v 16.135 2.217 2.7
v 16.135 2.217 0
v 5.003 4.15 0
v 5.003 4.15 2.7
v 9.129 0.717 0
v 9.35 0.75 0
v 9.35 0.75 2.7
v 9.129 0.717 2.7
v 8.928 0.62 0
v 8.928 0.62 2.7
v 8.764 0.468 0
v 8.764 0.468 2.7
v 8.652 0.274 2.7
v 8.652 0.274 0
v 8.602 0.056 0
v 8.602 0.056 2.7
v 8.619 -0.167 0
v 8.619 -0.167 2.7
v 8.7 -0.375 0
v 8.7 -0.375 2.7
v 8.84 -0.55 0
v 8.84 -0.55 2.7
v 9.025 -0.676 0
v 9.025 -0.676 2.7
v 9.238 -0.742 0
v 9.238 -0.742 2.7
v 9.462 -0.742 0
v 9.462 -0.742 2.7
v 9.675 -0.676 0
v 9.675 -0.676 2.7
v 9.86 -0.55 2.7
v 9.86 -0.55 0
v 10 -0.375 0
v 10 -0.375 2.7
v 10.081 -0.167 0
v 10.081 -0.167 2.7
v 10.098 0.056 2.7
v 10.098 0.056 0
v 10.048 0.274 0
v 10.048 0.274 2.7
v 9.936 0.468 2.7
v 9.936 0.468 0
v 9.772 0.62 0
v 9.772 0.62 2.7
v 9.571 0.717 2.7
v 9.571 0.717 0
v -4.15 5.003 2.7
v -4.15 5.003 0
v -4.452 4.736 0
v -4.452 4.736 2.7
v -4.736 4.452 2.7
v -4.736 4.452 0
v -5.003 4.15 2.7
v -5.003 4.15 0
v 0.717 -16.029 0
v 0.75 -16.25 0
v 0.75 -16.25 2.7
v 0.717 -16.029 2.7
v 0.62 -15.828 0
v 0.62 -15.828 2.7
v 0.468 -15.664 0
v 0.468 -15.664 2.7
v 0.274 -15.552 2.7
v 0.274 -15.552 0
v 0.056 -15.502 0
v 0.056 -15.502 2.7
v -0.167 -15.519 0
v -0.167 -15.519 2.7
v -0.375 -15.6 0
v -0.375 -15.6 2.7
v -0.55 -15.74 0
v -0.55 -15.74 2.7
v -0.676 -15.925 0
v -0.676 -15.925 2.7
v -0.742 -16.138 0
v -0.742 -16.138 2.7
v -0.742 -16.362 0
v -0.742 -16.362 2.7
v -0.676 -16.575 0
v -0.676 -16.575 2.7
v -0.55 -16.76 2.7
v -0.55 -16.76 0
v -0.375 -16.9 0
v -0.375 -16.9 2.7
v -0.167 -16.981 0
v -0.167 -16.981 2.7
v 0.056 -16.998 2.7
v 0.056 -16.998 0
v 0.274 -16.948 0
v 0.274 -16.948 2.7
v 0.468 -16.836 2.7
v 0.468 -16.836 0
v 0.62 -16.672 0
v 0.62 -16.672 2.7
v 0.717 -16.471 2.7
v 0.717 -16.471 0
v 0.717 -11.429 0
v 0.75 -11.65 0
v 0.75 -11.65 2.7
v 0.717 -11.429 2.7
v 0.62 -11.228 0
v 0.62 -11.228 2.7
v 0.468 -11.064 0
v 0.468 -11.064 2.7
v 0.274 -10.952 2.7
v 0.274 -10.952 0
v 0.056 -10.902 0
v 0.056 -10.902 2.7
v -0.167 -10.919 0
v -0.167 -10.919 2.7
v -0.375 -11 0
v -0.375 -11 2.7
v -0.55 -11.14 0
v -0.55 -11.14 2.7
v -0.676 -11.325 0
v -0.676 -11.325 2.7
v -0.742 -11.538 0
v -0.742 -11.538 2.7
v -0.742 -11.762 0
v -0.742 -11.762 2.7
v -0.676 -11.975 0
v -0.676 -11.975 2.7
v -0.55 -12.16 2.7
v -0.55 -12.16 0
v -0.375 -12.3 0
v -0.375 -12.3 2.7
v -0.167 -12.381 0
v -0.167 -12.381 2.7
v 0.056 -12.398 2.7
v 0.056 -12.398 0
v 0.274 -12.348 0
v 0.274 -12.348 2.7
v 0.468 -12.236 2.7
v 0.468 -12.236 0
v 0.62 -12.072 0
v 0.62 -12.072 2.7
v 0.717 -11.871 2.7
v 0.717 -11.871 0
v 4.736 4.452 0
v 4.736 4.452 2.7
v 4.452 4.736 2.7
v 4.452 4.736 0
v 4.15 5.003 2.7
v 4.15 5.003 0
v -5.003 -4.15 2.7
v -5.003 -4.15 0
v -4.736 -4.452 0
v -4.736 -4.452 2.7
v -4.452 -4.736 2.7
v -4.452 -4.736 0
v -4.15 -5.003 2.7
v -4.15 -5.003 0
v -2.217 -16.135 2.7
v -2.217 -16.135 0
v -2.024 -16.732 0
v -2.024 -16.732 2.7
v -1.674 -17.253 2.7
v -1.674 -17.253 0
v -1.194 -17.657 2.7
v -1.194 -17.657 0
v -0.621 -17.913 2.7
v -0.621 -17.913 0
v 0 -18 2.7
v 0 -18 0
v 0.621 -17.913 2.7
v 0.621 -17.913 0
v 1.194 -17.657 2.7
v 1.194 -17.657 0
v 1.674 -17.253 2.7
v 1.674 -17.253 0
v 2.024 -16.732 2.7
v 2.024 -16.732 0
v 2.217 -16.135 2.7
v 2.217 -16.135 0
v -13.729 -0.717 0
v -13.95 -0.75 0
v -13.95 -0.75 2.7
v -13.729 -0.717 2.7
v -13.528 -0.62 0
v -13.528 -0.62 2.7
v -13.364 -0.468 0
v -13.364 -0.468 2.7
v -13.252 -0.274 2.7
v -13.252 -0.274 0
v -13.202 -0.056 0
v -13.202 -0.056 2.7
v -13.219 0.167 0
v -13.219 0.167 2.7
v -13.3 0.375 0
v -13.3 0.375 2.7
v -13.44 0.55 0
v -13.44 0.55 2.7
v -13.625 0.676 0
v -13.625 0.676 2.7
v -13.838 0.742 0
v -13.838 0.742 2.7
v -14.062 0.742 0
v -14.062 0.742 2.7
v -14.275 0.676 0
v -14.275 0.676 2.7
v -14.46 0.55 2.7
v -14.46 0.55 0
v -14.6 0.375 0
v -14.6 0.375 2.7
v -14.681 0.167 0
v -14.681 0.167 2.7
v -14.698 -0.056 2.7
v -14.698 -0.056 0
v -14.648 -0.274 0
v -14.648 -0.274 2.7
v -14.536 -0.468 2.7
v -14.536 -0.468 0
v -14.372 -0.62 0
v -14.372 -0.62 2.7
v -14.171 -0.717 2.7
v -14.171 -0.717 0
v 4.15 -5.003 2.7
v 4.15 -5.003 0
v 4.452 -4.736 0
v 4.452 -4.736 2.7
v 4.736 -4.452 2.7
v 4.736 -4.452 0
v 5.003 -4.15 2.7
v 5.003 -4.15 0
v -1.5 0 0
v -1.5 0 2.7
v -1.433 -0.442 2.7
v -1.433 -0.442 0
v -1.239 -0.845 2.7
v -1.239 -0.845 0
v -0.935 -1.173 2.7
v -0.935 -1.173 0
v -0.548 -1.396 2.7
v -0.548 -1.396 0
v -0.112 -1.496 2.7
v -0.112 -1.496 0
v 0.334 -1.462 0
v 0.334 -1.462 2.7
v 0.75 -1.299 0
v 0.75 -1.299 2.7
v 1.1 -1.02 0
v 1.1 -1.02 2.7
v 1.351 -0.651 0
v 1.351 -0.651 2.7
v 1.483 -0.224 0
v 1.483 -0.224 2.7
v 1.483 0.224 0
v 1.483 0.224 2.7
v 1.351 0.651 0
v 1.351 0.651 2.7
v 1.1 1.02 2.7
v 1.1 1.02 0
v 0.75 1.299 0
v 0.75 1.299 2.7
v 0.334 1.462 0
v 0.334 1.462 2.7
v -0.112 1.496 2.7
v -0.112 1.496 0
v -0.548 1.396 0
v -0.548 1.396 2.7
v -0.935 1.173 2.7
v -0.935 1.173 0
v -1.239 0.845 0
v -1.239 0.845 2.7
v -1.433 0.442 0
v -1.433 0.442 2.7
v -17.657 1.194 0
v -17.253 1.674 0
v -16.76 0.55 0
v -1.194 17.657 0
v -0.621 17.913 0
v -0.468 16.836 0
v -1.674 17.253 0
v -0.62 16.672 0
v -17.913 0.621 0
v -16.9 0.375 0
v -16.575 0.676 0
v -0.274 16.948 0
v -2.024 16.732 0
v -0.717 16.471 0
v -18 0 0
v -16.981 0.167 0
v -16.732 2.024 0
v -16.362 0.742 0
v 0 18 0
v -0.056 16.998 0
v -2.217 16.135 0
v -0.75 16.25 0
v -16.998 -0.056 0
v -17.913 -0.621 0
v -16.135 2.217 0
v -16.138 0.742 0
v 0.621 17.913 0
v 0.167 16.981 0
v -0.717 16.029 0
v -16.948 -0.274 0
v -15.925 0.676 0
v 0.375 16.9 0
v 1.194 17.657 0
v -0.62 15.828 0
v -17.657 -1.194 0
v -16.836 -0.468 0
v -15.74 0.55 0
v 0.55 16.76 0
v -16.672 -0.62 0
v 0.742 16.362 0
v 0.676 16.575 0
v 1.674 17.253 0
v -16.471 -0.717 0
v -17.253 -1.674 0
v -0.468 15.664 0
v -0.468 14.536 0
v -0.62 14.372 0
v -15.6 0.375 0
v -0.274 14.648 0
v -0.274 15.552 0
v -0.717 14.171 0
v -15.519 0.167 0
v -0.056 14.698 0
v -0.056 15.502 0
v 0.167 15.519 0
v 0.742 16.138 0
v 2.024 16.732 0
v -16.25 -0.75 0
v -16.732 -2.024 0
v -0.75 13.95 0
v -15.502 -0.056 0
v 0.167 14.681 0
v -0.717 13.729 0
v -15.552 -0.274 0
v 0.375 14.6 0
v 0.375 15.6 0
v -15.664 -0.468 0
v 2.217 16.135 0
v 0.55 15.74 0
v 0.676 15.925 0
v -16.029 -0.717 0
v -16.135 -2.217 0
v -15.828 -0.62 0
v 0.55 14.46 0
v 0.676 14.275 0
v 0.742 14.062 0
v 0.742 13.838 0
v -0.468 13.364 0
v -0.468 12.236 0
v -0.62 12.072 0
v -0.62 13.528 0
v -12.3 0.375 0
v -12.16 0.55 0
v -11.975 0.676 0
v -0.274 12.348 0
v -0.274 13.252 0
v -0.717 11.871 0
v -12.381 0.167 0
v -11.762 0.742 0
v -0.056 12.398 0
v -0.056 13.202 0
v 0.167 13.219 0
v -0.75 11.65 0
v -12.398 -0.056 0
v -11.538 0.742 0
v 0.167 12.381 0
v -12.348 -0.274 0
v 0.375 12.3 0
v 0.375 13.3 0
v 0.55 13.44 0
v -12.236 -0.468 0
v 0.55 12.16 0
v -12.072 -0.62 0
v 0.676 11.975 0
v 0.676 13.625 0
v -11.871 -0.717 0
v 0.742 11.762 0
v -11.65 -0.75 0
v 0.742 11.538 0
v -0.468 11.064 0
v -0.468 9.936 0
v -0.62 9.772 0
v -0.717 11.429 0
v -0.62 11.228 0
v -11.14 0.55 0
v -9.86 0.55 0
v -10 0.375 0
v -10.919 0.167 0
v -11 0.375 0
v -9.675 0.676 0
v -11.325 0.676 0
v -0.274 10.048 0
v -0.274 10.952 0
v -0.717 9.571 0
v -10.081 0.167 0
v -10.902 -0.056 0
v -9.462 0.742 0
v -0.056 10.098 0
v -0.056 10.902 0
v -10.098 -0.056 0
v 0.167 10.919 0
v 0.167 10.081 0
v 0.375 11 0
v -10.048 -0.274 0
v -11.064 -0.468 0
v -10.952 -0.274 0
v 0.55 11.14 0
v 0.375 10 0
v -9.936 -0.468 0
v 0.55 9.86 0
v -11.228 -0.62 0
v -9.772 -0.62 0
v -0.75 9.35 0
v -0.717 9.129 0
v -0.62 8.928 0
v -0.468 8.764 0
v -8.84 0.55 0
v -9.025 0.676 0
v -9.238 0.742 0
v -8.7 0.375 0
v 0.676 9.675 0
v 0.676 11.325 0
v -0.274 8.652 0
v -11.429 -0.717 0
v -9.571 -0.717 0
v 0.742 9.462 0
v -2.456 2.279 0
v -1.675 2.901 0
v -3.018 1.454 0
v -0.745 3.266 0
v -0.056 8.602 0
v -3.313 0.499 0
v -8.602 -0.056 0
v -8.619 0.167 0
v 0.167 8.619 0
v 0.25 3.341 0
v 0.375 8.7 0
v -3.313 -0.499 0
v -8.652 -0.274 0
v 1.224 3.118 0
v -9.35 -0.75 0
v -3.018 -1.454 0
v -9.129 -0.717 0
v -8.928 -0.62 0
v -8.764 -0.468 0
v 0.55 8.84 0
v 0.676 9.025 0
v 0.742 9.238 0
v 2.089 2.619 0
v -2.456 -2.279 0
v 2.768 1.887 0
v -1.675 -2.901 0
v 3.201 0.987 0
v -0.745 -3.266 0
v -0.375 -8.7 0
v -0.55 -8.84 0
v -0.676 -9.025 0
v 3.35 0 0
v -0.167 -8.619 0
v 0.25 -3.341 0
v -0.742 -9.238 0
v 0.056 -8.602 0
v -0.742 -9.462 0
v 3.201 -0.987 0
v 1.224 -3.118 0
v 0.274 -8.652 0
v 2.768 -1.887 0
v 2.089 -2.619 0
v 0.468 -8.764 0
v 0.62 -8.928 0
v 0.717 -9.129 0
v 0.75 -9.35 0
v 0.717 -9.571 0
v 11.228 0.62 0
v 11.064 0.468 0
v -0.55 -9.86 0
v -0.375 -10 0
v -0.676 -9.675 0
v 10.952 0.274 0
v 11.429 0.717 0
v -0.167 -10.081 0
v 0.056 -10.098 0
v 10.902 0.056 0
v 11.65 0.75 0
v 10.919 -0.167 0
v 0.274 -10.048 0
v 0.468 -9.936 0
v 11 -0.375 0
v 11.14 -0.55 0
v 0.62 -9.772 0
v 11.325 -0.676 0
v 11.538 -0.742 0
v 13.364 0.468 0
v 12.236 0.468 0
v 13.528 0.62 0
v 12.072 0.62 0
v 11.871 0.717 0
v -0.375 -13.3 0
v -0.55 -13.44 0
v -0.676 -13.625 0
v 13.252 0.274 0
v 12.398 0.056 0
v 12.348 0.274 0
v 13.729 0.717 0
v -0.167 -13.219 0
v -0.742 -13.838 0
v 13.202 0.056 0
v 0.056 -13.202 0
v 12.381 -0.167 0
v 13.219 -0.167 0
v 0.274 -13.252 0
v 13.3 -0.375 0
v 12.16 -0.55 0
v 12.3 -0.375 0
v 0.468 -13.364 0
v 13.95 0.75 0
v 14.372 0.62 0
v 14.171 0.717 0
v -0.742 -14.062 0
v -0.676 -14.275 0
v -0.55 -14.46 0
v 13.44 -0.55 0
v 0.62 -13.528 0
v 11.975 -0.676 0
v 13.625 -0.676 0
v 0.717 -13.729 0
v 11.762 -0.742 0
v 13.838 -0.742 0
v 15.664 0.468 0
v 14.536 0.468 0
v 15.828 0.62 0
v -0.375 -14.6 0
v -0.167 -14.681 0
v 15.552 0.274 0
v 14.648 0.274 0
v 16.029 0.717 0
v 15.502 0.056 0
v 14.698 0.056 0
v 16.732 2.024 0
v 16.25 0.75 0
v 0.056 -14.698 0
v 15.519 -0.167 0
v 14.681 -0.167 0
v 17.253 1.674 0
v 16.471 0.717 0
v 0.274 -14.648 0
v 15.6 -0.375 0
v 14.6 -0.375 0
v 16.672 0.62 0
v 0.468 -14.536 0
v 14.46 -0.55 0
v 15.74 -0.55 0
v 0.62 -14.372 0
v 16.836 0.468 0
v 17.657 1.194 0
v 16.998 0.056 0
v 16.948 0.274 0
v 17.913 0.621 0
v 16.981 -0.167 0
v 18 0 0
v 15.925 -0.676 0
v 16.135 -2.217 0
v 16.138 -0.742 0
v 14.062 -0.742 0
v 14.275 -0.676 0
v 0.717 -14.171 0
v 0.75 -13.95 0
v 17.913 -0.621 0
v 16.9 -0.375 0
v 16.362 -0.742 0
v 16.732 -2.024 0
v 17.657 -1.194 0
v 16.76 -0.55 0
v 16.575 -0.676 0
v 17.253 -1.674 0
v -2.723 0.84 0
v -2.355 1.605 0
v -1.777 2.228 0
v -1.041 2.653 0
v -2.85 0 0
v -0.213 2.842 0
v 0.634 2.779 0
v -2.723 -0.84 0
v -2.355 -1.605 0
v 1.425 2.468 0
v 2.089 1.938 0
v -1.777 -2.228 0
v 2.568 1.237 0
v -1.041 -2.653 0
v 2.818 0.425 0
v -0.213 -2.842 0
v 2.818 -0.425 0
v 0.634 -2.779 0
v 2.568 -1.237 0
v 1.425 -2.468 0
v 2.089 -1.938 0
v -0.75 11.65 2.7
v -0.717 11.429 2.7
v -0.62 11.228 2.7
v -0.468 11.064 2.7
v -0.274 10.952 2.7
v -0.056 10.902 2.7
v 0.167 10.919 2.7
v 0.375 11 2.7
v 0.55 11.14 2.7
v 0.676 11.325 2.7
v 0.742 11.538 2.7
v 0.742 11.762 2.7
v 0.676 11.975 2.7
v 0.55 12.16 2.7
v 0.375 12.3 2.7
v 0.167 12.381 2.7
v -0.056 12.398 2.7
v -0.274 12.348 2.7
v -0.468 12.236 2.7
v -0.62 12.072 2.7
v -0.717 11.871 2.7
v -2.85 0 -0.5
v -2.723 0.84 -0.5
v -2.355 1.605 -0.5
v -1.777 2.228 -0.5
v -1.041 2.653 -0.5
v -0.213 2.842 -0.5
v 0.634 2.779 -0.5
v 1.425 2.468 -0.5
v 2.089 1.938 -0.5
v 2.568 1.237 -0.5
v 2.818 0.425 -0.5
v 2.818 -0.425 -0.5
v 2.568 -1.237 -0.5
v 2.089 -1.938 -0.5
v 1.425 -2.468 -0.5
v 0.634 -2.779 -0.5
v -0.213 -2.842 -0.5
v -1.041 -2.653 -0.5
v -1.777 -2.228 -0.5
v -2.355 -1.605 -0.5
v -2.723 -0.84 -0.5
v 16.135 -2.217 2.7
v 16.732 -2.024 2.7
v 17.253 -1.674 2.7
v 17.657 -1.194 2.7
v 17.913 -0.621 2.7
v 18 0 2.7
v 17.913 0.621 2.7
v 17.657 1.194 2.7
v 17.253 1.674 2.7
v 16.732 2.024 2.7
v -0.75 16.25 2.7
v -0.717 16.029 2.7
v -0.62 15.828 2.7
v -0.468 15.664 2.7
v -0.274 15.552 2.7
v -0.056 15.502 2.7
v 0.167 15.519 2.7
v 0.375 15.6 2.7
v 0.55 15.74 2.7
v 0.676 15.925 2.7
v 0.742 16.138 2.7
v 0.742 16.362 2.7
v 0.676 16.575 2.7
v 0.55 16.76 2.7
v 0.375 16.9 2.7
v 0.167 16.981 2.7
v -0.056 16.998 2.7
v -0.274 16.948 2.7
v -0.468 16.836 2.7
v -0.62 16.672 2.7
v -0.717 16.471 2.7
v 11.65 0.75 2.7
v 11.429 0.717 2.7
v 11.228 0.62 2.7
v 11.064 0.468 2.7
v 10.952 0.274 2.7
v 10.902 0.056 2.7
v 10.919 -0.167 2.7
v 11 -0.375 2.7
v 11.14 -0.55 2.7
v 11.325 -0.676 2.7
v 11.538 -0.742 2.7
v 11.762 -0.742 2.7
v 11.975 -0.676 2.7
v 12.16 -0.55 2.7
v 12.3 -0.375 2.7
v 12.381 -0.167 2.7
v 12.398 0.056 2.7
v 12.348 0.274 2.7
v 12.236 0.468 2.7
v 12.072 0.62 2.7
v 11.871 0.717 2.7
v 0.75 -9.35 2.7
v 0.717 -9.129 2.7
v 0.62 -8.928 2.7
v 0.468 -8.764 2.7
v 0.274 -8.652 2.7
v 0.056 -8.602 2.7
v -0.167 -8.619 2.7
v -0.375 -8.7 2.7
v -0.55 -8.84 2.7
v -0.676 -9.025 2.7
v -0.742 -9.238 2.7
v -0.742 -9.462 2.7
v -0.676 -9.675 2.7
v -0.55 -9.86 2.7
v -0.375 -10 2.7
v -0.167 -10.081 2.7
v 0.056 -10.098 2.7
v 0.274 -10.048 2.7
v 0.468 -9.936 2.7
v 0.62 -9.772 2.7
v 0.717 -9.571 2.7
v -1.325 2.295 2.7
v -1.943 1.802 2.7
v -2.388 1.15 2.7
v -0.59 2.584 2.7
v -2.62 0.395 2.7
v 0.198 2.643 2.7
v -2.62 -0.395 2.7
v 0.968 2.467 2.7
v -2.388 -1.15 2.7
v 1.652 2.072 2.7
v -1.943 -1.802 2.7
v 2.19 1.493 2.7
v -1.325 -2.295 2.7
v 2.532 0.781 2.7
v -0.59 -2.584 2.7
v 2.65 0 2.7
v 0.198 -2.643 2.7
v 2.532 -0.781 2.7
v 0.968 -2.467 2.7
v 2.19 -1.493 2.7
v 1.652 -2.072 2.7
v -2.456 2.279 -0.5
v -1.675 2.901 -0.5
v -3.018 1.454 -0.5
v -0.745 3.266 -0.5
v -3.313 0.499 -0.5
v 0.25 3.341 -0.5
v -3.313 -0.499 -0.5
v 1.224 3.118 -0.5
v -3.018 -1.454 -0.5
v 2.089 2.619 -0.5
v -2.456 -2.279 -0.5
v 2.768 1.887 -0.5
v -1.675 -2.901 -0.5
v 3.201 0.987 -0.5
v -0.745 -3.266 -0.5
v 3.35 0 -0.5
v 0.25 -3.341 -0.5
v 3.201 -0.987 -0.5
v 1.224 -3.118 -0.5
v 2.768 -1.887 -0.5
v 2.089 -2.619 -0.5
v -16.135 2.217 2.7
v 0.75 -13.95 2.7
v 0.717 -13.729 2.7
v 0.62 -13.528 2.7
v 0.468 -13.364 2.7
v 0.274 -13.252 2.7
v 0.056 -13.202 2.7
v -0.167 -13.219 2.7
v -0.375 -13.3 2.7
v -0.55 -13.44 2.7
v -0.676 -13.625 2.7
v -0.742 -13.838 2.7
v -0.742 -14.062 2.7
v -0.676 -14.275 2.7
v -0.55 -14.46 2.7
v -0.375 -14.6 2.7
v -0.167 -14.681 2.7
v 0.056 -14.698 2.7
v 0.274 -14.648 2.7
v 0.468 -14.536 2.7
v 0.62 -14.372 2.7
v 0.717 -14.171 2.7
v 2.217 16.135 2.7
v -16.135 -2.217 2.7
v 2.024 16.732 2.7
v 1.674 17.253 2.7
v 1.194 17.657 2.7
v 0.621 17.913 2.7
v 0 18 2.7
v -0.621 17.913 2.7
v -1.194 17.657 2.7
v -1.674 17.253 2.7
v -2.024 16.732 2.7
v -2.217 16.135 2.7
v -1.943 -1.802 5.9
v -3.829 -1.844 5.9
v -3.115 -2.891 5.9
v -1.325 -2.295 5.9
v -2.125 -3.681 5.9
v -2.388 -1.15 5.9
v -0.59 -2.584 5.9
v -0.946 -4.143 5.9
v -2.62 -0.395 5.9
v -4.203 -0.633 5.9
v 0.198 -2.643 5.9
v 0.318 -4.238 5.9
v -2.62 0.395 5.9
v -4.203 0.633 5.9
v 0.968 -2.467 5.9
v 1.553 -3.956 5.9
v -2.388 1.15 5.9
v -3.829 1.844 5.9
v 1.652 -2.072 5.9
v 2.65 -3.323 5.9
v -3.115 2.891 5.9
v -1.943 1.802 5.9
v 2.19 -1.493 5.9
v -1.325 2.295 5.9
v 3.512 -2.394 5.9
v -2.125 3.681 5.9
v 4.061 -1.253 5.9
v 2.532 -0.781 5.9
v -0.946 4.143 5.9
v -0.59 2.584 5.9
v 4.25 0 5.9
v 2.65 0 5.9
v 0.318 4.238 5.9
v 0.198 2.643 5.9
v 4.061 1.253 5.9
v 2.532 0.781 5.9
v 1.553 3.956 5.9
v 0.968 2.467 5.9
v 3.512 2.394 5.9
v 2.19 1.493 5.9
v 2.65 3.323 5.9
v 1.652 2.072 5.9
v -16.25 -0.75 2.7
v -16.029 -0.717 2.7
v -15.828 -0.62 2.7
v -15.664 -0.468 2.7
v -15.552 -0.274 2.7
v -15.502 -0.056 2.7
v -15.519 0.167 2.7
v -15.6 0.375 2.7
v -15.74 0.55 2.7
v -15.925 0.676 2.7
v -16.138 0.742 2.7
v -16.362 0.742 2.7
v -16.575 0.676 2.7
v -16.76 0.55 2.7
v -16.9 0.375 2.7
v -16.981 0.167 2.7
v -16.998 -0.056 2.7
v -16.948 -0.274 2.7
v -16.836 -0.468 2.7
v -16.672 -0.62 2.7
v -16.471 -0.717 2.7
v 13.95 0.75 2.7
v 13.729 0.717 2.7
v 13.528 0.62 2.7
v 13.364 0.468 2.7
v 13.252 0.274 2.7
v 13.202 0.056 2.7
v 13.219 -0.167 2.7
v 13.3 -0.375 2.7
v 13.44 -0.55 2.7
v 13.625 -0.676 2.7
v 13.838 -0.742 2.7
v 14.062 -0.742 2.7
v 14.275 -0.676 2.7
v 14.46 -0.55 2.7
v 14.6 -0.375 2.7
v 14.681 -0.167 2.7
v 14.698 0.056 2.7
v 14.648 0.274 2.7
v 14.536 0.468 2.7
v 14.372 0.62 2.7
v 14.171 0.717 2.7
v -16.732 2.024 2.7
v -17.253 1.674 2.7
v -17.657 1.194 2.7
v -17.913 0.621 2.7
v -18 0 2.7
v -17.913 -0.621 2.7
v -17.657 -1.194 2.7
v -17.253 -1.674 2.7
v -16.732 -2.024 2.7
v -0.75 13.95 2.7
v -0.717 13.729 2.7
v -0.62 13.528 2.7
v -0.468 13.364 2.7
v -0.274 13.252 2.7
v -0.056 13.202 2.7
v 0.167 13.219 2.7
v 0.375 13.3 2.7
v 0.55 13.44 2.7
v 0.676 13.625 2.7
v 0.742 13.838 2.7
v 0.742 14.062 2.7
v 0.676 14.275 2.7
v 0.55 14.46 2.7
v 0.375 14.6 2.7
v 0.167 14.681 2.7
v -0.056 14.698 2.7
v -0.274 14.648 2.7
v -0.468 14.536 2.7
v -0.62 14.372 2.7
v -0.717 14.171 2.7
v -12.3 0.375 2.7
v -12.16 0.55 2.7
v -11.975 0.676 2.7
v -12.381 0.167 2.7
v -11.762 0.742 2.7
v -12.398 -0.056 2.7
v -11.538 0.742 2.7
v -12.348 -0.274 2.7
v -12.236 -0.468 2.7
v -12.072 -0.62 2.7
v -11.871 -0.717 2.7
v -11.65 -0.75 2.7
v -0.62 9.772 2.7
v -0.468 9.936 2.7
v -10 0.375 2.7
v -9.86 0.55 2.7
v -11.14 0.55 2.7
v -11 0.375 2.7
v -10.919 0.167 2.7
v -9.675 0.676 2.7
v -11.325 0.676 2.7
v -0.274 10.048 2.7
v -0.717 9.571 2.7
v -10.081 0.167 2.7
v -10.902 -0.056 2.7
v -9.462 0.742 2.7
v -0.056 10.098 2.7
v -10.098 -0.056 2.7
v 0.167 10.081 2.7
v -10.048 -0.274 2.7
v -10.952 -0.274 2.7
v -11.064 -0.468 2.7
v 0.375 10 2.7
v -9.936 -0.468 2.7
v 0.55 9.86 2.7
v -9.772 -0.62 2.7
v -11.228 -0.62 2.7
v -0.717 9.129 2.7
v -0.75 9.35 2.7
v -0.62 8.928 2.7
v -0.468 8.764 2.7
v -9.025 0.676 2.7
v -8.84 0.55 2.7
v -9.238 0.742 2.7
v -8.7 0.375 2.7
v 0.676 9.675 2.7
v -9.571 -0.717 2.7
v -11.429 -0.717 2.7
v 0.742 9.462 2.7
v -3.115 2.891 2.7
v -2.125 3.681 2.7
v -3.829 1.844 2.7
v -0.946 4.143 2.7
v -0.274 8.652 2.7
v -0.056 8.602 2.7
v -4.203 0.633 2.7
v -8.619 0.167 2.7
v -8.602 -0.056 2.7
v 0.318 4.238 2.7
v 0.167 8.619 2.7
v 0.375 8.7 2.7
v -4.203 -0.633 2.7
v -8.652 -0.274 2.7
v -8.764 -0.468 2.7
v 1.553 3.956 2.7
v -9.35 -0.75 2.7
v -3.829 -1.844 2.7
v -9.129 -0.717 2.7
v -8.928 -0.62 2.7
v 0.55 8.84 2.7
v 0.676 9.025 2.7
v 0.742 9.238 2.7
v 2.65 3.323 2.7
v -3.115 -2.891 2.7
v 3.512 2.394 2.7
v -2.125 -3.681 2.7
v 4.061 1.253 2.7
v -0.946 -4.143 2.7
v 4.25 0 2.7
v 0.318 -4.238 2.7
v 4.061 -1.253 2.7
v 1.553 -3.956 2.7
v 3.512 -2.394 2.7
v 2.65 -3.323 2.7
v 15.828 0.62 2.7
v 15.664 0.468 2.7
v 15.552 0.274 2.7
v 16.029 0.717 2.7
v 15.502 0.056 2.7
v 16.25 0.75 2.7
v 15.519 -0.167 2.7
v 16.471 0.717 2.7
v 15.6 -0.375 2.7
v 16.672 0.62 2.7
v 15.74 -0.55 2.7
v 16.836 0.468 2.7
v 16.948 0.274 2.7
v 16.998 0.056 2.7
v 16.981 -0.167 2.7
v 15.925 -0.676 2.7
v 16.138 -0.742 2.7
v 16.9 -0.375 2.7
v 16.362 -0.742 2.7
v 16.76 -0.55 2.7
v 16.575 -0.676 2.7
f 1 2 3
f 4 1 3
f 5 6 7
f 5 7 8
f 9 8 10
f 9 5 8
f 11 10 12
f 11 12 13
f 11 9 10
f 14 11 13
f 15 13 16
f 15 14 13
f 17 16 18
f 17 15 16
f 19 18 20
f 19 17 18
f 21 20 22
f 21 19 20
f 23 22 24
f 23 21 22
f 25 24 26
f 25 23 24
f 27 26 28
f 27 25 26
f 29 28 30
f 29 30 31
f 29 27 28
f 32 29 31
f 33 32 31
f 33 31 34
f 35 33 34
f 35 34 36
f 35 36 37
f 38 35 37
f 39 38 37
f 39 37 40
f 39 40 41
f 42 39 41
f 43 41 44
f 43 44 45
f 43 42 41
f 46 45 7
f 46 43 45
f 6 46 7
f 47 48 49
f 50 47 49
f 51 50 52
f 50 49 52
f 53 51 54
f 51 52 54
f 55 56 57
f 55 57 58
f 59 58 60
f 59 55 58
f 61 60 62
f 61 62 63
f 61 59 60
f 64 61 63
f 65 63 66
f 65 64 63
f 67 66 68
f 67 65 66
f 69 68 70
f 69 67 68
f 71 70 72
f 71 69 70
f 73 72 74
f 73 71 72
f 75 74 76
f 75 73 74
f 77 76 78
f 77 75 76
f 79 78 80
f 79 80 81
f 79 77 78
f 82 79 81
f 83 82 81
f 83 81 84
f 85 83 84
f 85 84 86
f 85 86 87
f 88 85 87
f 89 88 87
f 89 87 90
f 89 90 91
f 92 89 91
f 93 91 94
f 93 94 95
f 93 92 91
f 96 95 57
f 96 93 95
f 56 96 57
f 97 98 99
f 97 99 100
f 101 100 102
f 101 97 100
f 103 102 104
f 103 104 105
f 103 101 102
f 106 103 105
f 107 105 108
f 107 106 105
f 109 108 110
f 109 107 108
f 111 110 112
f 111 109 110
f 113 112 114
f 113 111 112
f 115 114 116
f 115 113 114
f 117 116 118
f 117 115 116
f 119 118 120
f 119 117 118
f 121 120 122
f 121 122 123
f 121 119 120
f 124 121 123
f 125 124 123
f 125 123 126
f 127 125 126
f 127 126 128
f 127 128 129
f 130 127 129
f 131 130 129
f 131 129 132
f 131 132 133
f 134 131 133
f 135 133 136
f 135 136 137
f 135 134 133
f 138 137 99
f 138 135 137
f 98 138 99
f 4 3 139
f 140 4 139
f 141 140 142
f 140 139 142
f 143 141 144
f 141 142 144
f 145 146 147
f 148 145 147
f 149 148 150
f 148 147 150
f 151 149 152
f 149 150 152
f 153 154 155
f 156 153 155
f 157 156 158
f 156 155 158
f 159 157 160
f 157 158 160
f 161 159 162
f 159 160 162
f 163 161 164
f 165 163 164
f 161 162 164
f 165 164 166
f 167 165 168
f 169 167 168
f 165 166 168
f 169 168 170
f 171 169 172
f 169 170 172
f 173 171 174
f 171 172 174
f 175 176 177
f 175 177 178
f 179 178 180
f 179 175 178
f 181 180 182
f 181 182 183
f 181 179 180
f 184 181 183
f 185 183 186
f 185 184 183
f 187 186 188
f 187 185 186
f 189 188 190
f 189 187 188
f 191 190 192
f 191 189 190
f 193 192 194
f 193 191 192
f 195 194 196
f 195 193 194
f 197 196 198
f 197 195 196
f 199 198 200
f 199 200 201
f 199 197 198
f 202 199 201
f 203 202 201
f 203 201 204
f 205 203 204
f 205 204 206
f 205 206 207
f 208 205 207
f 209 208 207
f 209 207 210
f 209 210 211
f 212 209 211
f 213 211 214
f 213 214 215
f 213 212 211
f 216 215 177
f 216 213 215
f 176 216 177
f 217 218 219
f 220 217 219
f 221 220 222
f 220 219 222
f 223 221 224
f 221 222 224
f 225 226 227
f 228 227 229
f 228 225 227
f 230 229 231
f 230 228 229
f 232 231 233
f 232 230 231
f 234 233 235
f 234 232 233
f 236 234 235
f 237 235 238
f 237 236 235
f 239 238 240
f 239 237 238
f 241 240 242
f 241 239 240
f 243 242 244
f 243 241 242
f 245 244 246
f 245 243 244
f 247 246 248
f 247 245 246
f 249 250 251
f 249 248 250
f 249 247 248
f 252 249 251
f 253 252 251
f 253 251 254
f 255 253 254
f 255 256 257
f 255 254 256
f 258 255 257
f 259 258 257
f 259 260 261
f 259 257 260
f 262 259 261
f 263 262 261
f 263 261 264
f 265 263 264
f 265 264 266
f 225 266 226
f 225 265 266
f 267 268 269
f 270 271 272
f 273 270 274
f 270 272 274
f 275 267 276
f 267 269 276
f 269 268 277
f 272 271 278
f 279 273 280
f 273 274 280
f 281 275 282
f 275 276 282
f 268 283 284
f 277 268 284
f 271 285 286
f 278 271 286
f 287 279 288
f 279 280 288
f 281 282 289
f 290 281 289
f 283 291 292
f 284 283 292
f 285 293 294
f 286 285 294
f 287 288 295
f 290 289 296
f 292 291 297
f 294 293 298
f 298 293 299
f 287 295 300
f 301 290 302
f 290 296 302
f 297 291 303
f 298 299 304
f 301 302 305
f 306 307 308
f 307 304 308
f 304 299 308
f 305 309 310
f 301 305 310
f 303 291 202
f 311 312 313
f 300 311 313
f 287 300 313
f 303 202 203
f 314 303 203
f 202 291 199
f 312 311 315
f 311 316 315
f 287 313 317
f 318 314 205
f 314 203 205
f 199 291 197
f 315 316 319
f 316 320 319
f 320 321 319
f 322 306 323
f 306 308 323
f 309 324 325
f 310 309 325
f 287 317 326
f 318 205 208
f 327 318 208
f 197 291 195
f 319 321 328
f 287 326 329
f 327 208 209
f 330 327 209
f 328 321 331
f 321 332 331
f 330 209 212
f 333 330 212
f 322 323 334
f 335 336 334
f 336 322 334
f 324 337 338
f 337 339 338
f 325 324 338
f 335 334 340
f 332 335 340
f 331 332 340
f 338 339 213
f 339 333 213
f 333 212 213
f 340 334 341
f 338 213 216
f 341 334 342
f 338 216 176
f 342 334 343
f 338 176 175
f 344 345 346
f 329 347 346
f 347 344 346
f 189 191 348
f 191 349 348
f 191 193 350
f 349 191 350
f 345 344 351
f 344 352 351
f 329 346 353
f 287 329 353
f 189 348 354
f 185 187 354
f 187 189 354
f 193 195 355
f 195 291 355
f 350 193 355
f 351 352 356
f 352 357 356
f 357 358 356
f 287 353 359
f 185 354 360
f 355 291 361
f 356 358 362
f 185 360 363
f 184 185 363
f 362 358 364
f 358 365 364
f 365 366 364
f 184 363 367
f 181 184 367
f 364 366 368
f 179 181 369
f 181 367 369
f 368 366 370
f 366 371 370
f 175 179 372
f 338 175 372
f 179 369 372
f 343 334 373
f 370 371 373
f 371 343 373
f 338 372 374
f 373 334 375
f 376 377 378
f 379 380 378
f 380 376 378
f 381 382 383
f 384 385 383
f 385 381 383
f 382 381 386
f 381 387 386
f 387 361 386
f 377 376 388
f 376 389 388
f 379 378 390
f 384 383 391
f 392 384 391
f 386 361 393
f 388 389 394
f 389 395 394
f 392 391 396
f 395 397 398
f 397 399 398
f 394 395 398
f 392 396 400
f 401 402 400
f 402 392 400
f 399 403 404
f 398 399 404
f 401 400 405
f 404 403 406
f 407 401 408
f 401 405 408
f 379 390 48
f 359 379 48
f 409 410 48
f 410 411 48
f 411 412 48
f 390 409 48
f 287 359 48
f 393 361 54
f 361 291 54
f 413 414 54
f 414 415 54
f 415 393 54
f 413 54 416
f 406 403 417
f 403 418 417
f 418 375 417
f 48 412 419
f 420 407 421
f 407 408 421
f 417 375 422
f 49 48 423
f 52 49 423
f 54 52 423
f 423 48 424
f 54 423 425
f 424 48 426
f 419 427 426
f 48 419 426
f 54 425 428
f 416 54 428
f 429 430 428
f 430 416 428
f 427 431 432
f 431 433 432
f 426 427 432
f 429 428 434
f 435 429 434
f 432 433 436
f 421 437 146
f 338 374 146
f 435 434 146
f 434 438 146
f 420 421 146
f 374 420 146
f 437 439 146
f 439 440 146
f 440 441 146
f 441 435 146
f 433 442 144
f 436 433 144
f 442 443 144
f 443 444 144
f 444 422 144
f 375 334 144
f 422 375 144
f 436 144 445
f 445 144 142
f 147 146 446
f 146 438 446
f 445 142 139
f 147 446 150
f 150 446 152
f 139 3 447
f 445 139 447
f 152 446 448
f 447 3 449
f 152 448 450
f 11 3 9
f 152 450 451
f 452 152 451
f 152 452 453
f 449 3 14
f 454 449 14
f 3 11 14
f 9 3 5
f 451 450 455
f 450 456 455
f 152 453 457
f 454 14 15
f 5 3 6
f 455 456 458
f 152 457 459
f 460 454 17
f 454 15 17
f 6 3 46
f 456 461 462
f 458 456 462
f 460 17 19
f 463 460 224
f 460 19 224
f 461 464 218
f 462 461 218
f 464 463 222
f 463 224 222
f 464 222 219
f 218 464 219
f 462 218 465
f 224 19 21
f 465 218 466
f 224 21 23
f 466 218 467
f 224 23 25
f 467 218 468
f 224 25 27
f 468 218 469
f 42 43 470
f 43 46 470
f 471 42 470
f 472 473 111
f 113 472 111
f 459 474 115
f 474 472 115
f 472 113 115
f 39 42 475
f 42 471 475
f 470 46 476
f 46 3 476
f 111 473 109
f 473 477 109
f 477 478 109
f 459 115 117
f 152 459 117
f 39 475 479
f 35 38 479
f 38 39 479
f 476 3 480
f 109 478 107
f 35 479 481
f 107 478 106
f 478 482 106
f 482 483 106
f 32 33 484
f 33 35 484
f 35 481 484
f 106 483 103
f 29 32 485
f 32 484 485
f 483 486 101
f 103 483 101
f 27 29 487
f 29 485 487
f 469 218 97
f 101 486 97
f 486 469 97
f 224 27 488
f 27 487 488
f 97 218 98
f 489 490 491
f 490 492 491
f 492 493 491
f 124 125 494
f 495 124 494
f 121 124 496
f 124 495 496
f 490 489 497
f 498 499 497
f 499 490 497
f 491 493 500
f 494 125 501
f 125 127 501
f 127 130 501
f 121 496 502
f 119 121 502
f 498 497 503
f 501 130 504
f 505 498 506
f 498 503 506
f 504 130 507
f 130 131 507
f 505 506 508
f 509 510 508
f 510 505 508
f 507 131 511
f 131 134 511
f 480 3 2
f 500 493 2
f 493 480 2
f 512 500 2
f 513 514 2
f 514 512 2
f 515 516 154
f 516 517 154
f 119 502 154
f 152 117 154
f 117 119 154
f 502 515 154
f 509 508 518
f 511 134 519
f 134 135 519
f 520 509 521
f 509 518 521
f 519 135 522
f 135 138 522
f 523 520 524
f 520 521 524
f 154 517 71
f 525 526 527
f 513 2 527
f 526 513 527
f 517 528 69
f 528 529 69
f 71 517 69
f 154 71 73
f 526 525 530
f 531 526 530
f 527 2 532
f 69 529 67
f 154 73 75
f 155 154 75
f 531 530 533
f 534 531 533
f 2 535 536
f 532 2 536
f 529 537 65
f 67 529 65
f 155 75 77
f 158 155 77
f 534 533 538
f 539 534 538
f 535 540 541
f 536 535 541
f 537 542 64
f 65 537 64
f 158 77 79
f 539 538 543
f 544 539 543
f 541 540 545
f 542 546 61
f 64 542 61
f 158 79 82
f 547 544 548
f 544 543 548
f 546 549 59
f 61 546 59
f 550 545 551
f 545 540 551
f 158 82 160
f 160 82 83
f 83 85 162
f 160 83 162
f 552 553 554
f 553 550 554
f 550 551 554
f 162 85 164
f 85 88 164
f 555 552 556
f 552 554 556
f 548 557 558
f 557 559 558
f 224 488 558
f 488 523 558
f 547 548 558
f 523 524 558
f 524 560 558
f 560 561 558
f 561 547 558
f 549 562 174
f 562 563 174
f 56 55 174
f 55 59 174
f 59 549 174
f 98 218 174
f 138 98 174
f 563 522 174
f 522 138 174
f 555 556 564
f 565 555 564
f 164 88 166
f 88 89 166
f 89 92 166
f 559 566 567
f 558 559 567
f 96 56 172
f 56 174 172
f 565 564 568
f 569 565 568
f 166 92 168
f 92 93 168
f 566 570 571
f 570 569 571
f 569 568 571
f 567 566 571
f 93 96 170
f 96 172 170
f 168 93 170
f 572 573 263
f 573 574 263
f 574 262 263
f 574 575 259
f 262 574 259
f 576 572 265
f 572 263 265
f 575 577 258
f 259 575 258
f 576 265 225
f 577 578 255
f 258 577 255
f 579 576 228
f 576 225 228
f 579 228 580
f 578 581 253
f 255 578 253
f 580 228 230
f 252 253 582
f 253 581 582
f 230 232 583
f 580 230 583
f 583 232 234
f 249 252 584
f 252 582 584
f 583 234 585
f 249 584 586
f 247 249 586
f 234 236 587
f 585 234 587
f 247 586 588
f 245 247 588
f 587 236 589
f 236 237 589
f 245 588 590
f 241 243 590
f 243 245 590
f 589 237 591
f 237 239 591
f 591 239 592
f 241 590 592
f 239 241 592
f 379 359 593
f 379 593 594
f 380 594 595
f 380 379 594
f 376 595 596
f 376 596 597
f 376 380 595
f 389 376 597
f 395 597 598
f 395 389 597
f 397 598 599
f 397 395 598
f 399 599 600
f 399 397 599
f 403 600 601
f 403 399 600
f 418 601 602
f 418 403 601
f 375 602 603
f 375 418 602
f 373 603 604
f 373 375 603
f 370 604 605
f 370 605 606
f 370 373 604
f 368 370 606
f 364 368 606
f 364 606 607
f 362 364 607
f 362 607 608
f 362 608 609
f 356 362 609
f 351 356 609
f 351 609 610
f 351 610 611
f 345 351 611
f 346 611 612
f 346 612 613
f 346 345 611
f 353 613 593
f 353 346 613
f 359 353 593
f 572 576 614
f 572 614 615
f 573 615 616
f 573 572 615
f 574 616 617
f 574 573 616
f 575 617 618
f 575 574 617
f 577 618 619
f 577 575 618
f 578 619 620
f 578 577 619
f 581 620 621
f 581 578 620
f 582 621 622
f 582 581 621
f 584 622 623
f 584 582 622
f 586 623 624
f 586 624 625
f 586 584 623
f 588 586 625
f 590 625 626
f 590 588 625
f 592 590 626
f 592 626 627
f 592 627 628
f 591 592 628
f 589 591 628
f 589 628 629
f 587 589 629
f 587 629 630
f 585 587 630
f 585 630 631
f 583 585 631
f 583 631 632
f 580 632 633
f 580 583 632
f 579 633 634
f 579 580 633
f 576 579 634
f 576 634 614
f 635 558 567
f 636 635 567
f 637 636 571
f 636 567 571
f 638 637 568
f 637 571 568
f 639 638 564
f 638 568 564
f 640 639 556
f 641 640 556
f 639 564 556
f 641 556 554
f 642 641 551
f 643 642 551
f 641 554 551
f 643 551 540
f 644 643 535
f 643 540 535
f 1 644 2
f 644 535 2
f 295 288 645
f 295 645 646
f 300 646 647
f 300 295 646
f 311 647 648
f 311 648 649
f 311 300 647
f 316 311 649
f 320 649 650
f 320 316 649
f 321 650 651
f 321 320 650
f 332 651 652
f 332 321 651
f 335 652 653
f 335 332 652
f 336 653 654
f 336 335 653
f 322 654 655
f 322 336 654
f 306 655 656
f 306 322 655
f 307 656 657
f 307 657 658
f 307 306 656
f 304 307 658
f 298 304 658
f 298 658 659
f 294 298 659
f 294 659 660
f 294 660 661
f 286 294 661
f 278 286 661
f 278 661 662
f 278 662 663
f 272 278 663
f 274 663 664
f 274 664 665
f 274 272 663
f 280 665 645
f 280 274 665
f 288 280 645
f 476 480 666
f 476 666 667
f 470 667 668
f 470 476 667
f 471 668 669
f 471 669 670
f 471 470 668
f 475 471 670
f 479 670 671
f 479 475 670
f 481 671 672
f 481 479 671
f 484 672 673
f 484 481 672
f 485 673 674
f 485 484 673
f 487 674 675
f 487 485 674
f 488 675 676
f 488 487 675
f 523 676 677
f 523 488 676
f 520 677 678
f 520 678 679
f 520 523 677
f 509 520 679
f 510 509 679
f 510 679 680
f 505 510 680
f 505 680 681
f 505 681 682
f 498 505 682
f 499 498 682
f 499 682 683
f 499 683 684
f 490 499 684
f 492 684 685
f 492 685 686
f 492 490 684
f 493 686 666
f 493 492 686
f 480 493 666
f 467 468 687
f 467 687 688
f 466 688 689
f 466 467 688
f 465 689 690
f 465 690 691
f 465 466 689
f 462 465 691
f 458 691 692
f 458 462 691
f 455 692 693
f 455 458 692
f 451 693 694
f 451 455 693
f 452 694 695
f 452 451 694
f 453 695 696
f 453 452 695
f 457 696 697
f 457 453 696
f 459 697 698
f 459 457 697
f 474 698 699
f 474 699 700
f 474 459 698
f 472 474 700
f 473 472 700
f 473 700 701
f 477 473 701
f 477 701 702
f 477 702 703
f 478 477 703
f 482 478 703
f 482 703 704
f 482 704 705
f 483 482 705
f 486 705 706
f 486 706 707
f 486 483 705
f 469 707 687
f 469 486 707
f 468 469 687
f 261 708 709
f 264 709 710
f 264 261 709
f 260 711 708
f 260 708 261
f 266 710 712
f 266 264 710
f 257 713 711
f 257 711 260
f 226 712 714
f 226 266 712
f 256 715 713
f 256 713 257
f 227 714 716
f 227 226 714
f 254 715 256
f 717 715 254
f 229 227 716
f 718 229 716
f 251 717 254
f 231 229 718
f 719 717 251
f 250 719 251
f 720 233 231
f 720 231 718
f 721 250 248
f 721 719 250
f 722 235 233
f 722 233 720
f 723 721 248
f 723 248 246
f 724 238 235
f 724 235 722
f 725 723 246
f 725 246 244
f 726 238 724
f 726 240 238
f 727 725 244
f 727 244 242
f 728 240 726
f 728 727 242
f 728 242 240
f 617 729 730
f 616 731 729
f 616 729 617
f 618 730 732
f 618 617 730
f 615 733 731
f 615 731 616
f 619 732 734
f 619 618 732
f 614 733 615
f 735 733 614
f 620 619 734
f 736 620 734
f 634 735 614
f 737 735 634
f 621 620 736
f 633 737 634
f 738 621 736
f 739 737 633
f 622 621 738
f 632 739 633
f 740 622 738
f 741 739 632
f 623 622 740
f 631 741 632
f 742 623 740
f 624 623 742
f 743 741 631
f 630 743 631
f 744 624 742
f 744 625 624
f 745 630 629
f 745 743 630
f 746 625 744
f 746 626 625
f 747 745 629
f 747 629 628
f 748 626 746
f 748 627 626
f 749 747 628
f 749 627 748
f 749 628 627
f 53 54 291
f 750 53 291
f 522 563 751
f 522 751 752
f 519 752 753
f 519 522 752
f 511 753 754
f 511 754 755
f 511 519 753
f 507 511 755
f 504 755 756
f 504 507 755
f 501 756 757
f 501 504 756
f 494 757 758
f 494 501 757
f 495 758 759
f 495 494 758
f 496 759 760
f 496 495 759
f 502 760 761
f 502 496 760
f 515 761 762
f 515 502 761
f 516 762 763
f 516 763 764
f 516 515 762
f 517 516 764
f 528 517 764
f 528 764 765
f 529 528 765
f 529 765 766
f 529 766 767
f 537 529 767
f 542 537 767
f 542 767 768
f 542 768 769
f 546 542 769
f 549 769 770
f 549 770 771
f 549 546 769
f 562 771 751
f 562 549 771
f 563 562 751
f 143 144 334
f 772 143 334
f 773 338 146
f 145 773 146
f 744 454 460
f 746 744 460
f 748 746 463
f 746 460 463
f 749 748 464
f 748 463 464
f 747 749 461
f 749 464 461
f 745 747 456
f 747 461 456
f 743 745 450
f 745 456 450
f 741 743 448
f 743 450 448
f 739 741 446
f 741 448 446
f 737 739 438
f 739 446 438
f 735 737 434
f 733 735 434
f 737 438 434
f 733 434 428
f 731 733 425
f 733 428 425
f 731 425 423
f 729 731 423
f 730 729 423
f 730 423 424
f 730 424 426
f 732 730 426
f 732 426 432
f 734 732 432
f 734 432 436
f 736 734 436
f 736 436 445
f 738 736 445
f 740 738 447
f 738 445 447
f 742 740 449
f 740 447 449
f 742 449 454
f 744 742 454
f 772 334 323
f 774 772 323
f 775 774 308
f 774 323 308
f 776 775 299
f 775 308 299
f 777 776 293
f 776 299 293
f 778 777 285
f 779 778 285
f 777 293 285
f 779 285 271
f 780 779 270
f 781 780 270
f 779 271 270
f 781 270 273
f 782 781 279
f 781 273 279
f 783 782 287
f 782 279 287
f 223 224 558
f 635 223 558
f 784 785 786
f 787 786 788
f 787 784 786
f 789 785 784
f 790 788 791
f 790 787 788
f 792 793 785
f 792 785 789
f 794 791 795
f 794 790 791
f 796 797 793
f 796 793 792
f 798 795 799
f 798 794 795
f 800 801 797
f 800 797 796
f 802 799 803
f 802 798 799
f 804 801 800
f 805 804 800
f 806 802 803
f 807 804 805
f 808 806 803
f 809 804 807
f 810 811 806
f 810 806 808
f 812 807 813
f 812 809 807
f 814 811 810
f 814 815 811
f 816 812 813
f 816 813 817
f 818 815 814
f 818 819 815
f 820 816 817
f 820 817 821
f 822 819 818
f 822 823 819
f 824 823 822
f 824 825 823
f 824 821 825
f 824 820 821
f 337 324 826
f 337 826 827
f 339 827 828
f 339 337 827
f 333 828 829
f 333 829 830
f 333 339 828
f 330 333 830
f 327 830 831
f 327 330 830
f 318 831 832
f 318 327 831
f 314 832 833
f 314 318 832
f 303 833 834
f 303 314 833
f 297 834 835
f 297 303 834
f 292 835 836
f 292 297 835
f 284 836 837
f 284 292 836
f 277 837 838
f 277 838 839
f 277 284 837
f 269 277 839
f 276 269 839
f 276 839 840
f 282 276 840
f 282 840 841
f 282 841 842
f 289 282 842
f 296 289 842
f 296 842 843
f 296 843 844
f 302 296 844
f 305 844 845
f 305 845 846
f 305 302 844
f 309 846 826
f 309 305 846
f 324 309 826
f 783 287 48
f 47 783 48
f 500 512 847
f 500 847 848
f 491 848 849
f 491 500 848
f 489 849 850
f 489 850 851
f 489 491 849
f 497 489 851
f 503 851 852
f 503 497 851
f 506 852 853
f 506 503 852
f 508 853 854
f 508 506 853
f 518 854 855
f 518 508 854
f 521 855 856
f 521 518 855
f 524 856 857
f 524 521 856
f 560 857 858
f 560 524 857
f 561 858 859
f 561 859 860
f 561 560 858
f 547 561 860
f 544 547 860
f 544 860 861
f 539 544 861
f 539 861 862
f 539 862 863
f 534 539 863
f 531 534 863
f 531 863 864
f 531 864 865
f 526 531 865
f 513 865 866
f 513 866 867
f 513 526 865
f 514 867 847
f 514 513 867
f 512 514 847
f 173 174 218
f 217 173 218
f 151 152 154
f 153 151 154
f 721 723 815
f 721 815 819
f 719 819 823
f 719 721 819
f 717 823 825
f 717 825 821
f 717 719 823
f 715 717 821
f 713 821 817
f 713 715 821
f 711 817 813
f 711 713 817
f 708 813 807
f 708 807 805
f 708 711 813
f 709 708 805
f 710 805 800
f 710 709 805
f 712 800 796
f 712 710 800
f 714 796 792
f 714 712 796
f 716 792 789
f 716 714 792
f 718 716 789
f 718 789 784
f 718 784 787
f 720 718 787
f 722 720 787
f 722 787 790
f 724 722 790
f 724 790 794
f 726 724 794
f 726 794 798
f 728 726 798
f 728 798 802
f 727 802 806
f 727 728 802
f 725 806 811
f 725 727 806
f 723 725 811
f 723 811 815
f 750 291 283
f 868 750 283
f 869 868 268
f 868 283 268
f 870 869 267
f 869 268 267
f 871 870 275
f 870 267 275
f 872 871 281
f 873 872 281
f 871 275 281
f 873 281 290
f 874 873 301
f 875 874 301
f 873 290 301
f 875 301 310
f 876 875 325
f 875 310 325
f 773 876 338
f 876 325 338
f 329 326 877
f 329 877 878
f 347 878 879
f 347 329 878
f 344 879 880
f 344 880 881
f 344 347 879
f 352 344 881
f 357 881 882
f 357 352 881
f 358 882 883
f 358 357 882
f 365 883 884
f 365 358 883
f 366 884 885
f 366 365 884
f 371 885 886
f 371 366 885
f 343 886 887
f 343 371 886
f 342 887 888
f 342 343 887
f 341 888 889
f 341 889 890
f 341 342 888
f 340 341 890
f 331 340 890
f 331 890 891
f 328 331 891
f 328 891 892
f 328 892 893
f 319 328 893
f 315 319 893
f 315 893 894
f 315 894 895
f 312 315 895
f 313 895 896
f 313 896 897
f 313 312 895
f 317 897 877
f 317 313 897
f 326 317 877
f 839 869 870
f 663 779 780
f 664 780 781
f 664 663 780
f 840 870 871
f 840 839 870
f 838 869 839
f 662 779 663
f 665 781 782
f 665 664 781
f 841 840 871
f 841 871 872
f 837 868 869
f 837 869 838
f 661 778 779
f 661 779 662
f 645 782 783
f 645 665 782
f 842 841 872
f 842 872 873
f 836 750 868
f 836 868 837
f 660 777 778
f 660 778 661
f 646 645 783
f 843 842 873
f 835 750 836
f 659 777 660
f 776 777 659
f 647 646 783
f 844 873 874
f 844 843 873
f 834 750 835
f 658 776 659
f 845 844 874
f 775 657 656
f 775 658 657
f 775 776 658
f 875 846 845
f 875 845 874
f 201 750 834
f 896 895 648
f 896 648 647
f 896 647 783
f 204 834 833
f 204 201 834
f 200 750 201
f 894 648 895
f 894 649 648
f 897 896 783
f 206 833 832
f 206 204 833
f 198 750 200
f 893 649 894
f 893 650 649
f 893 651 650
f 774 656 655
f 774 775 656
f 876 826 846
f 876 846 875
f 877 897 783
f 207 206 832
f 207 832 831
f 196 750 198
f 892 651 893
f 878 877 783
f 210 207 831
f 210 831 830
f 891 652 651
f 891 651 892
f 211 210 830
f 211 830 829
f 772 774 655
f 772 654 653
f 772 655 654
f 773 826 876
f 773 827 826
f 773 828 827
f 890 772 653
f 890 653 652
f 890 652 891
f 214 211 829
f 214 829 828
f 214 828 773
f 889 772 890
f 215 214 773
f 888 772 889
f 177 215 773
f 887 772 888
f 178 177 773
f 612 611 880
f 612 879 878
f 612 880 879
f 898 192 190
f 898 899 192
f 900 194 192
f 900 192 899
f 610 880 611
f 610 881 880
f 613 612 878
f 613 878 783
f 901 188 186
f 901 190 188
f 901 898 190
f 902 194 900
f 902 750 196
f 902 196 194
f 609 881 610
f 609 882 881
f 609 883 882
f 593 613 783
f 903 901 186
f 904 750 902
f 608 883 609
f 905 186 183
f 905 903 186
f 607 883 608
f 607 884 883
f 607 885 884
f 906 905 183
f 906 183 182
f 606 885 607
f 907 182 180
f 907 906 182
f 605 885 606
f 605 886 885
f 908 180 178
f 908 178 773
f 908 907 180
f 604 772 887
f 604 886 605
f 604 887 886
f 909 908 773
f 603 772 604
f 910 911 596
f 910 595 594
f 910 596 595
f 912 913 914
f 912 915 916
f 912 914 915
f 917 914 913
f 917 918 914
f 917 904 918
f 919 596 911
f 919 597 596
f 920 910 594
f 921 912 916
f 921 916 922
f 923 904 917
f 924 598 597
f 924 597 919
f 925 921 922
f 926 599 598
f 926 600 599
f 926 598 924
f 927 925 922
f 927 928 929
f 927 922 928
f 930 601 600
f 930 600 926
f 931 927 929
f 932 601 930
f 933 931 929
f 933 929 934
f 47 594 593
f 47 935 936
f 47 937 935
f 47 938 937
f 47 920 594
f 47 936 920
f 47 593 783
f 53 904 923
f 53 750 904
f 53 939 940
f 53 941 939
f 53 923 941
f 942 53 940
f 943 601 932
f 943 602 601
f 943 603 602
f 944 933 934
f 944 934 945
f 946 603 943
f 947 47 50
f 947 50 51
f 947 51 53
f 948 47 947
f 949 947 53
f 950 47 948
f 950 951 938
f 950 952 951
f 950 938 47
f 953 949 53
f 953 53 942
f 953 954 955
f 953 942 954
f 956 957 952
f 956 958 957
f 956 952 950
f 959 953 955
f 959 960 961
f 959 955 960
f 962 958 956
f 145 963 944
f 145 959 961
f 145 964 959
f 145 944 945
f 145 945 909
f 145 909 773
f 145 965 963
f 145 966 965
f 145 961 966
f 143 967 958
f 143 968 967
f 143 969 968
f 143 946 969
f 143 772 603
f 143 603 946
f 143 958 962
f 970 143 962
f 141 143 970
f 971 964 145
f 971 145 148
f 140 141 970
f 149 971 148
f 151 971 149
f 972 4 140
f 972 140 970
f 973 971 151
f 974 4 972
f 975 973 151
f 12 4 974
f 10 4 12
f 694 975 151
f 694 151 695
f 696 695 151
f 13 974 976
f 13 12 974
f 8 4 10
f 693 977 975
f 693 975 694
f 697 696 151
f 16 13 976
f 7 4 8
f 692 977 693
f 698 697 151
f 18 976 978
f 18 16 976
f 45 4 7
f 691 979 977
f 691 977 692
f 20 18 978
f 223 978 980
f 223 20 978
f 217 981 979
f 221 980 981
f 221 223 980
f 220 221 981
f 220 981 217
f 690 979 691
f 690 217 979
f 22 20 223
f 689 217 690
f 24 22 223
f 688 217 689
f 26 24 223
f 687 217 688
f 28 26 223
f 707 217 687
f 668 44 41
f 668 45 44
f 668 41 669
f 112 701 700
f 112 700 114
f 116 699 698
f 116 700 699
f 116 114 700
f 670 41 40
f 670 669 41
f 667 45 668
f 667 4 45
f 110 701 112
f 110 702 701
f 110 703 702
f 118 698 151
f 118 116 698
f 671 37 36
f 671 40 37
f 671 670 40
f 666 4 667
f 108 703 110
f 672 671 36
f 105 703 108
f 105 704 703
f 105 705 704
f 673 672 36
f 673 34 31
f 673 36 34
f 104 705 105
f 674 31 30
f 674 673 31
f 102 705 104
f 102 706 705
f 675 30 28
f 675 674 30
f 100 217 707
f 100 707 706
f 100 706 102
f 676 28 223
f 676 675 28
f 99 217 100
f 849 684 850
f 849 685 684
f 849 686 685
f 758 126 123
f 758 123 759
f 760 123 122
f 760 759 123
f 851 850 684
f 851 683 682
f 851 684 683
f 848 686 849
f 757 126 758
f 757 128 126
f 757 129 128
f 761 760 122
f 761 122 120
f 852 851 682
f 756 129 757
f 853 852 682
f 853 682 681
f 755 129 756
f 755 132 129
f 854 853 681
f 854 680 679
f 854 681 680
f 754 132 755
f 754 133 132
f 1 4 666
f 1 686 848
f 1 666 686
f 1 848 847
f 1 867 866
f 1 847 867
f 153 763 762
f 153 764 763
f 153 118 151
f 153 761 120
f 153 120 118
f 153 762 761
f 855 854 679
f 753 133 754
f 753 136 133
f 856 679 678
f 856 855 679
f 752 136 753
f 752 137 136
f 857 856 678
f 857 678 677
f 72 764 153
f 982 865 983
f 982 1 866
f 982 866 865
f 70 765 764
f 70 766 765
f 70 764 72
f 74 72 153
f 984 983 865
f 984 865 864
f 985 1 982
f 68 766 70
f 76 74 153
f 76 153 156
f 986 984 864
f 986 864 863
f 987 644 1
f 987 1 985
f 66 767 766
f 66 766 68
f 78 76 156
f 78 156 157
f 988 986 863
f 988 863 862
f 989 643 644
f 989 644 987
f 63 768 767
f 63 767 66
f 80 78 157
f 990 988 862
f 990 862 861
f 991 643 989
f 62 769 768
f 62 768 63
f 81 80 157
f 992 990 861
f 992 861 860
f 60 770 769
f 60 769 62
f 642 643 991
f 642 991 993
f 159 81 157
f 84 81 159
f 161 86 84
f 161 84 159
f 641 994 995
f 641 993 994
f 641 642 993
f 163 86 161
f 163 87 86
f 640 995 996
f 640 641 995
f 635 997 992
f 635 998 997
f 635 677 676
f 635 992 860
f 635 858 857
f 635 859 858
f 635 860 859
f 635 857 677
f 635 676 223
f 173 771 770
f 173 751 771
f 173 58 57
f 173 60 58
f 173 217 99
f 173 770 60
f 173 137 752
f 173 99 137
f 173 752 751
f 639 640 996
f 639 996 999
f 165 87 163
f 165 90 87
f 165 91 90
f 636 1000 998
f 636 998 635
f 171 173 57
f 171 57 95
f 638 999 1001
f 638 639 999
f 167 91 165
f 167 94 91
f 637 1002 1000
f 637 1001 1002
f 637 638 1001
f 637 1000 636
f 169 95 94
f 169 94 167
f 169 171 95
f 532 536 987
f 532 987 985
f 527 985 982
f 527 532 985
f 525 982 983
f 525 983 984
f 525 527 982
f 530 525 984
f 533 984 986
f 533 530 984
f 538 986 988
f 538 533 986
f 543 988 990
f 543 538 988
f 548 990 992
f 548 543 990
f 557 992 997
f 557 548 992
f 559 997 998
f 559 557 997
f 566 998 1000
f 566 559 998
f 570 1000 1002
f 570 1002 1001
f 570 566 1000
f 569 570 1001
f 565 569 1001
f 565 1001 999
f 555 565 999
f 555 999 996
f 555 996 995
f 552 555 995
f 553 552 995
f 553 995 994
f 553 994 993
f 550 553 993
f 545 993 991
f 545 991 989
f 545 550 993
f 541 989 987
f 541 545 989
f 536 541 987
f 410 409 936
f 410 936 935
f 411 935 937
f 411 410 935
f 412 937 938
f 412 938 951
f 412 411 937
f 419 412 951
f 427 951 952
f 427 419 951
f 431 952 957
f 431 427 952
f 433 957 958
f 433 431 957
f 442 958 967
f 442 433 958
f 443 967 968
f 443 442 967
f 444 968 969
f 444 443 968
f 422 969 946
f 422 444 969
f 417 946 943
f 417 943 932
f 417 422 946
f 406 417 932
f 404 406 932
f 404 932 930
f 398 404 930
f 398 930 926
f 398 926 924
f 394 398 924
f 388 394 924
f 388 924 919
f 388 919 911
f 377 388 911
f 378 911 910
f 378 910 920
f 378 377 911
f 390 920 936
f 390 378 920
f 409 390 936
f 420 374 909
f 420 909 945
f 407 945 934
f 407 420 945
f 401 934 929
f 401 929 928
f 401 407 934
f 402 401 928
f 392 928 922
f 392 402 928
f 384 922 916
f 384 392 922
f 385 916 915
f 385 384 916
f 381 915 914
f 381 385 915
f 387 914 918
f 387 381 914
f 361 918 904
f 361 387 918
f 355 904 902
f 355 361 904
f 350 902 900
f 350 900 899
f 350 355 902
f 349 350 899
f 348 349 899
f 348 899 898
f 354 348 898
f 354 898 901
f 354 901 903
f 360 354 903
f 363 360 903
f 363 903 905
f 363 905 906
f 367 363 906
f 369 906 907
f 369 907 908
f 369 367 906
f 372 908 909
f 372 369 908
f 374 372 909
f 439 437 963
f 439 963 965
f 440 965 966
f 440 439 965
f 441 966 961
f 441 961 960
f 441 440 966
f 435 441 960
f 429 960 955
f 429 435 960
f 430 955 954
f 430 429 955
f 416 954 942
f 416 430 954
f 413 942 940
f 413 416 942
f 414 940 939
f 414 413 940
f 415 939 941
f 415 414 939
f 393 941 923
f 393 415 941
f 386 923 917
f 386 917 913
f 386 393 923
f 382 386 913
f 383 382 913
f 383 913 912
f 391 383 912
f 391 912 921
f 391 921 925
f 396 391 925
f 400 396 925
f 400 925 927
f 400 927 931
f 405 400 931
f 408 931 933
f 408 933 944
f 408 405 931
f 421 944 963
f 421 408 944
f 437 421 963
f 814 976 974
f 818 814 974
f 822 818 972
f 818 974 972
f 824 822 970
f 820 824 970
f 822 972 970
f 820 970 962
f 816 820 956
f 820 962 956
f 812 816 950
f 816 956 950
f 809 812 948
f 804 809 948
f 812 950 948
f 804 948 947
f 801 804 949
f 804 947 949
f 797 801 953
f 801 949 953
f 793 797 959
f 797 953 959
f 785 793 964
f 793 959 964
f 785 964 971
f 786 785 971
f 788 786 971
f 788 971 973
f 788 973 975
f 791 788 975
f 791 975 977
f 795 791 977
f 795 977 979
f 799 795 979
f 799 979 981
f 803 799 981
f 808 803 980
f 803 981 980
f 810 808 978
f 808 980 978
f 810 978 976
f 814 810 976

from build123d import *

# Parameters (mm, degrees)
ESBO_O1_R                = 0.75
ESBO_O1_R_2              = 1.5
RESSALTO_EXTRUS_O1_DEPTH = 2.7
PADR_OCIRCULAR1_COUNT    = 4
ESBO_O2_R                = 4.25
ESBO_O2_R_2              = 2.65
RESSALTO_EXTRUS_O2_DEPTH = 3.2
ESBO_O3_R                = 3.35
ESBO_O3_R_2              = 2.85
RESSALTO_EXTRUS_O3_DEPTH = 0.5


with BuildPart() as part:
    # Esboço1 → Ressalto-extrusão1 (new body)
    with BuildSketch(Plane.XY):
        with BuildLine():
            Line((-2.21682252, 16.134964821), (-4.15, 5.002749244))
            ThreePointArc((-4.15, 5.002749244), (0, -6.5), (4.15, 5.002749244))
            Line((4.15, 5.002749244), (2.21682252, 16.134964821))
            ThreePointArc((2.21682252, 16.134964821), (0, 18), (-2.21682252, 16.134964821))
        make_face()
        with Locations(Location((0, 16.25, 0), (0, 0, 180))):
            Circle(ESBO_O1_R, mode=Mode.SUBTRACT)
        with Locations(Location((0, 13.95, 0), (0, 0, 180))):
            Circle(ESBO_O1_R, mode=Mode.SUBTRACT)
        with Locations(Location((0, 11.65, 0), (0, 0, 180))):
            Circle(ESBO_O1_R, mode=Mode.SUBTRACT)
        with Locations(Location((0, 9.35, 0), (0, 0, 180))):
            Circle(ESBO_O1_R, mode=Mode.SUBTRACT)
        with Locations(Location((0, 0, 0), (0, 0, 180))):
            Circle(ESBO_O1_R_2, mode=Mode.SUBTRACT)
    ressalto_extrus_o1 = extrude(amount=RESSALTO_EXTRUS_O1_DEPTH)

    # PadrãoCircular1: Ressalto-extrusão1 ×4 about axis
    padr_ocircular1_axis = Axis((0, 0, 0), (0, 0, 1))
    for i in range(1, PADR_OCIRCULAR1_COUNT):
        add(ressalto_extrus_o1.rotate(padr_ocircular1_axis, i * 360 / PADR_OCIRCULAR1_COUNT))

    # Esboço2 → Ressalto-extrusão2 (add)
    with BuildSketch(Plane.XY.offset(2.7)):
        Circle(ESBO_O2_R)
        Circle(ESBO_O2_R_2, mode=Mode.SUBTRACT)
    extrude(amount=RESSALTO_EXTRUS_O2_DEPTH)

    # Esboço3 → Ressalto-extrusão3 (add)
    with BuildSketch(Plane(origin=(0, 0, 0), x_dir=(-1, 0, 0), z_dir=(0, 0, -1))):
        with Locations(Location((0, 0, 0), (0, 0, 180))):
            Circle(ESBO_O3_R)
        Circle(ESBO_O3_R_2, mode=Mode.SUBTRACT)
    extrude(amount=RESSALTO_EXTRUS_O3_DEPTH)


solid = part.part
